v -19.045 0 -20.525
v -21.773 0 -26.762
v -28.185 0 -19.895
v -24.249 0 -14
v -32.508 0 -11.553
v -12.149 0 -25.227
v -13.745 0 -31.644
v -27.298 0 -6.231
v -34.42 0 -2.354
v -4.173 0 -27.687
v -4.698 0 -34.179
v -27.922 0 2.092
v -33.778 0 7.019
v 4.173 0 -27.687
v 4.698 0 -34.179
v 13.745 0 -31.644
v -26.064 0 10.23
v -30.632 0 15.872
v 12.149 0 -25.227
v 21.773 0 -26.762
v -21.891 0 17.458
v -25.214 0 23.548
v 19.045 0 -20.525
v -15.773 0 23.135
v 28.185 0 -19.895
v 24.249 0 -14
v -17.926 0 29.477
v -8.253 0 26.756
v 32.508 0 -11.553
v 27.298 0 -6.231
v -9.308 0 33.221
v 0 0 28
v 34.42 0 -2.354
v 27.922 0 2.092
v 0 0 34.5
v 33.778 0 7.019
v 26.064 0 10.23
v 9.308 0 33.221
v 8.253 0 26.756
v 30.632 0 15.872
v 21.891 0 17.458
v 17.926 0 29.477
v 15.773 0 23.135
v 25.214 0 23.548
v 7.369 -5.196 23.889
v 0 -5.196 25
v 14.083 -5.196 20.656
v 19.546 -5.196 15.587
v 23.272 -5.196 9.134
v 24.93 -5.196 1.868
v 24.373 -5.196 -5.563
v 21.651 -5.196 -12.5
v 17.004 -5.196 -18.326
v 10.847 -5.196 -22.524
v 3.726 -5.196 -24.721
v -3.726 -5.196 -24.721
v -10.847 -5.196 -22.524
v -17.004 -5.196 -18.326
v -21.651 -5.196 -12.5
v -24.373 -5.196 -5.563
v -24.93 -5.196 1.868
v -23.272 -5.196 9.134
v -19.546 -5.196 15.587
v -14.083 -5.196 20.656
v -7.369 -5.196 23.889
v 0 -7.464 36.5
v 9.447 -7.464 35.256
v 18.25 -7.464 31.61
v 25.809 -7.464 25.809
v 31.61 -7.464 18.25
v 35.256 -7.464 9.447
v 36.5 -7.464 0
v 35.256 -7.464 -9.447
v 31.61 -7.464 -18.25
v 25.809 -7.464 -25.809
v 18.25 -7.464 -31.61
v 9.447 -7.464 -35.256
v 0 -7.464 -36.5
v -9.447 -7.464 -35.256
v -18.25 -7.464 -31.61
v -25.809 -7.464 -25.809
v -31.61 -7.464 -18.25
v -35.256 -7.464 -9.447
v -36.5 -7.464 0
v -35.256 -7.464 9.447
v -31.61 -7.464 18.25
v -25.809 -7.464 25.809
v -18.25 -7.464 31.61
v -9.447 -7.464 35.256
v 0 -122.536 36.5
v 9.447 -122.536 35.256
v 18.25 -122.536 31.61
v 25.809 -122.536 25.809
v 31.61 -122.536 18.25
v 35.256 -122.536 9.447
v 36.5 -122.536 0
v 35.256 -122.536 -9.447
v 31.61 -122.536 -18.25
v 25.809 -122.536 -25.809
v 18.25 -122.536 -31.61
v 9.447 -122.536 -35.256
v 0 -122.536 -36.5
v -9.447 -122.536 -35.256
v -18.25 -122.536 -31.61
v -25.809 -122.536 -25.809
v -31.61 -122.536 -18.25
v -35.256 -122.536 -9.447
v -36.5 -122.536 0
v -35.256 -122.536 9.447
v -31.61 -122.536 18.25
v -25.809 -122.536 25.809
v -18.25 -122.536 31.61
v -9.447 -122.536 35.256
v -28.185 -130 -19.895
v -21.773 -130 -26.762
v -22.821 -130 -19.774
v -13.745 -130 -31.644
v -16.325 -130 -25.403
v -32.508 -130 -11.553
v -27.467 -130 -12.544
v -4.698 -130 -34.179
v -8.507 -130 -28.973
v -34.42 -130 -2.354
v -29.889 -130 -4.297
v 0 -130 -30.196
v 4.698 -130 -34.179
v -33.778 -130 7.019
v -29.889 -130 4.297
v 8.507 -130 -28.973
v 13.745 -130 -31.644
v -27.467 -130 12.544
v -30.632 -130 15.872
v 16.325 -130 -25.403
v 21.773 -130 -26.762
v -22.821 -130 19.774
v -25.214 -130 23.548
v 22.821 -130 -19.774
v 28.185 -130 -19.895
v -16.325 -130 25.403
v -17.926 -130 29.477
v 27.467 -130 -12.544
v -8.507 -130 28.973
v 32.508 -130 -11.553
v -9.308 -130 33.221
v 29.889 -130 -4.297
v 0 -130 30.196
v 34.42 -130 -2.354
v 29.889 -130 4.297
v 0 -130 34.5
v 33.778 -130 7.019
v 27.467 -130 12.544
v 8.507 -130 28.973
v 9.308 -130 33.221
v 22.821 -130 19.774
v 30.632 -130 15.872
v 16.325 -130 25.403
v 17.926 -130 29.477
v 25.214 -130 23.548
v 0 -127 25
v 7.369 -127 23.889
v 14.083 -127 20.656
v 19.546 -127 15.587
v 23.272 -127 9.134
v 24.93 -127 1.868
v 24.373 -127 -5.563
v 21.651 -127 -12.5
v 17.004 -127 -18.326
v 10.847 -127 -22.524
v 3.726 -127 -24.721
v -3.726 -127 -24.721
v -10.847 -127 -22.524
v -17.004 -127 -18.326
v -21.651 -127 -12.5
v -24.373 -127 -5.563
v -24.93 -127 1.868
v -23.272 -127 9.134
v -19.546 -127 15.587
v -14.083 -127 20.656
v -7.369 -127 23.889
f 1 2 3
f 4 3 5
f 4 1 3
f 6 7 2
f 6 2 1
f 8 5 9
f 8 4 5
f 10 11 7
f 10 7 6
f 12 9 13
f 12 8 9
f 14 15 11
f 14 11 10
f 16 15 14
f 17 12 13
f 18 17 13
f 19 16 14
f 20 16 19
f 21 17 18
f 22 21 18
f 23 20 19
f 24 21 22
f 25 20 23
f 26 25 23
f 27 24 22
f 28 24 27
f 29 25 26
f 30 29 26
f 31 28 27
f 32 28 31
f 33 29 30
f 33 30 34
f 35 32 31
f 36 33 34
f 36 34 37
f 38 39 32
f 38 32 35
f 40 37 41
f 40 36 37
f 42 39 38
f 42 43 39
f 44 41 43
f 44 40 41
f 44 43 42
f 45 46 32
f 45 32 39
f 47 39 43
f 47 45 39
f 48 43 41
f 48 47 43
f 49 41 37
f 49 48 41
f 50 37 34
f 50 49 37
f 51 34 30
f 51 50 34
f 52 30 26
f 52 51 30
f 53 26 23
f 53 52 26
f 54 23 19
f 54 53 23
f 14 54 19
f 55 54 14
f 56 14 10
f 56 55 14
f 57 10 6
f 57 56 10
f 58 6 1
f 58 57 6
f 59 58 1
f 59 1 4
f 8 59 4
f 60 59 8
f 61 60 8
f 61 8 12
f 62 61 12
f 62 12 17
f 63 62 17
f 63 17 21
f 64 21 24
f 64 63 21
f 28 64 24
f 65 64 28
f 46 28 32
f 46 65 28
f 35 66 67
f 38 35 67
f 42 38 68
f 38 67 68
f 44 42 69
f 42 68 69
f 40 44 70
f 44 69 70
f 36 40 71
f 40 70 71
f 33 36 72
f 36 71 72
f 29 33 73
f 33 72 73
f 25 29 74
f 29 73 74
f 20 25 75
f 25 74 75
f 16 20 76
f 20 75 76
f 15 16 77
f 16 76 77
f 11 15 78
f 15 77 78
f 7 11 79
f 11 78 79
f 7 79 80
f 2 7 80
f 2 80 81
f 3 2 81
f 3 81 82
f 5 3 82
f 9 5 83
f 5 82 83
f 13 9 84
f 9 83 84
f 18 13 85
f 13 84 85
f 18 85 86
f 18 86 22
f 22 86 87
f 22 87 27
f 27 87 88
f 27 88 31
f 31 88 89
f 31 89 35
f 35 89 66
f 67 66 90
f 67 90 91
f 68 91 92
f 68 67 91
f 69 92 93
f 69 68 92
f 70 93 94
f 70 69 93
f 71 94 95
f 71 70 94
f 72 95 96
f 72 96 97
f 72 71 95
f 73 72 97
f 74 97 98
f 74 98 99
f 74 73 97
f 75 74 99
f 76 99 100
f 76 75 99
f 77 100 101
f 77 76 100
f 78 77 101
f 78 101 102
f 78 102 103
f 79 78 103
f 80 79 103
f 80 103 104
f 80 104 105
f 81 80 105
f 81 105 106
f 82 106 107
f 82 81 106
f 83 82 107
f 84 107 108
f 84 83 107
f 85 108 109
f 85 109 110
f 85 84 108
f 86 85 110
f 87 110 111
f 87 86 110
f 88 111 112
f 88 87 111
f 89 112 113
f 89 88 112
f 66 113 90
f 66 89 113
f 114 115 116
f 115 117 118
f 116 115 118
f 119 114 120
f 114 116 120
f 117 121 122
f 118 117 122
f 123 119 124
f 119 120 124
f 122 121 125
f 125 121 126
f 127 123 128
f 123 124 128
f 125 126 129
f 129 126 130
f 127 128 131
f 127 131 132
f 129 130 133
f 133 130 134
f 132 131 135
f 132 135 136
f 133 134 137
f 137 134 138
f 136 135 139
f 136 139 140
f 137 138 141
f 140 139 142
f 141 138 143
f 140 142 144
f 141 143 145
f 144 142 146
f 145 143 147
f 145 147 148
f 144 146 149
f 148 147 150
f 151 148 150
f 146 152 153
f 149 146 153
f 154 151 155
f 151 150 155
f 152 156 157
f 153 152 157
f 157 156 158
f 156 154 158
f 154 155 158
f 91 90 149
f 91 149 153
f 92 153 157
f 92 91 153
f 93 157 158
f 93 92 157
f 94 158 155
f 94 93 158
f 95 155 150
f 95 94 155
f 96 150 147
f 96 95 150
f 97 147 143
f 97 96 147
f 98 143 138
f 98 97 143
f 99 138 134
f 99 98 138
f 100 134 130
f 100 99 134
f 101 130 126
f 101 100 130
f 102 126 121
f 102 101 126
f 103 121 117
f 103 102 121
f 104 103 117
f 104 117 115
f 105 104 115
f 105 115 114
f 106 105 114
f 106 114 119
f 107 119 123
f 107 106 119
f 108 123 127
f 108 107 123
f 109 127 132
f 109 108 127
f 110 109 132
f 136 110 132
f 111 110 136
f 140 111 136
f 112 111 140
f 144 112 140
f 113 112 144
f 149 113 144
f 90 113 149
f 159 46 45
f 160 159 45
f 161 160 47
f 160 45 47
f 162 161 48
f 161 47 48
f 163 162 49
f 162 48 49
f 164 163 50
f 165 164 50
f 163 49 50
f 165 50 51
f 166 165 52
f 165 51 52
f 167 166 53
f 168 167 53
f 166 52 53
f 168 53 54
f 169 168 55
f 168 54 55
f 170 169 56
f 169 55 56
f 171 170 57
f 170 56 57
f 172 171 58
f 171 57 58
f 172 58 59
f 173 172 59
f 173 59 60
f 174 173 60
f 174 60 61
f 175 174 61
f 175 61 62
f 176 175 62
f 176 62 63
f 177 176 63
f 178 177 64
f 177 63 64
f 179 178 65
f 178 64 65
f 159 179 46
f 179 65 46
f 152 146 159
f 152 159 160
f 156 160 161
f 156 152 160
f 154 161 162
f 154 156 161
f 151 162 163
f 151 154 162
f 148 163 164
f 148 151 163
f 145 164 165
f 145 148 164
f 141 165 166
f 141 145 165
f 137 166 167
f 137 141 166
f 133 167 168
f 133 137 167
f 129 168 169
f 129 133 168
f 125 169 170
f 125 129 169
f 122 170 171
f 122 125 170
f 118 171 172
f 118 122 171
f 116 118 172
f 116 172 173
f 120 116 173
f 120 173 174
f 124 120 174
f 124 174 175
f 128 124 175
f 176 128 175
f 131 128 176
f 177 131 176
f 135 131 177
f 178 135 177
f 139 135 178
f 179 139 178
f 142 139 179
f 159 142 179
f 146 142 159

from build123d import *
from OCP.BRepFilletAPI import BRepFilletAPI_MakeChamfer

# Parameters (mm, degrees)
SKETCH1_R           = 36.5
SKETCH1_R_2         = 25
BOSS_EXTRUDE1_DEPTH = 130
CHAMFER1_SIZE       = 3
CHAMFER1_SIZE2      = 5.196152423
CHAMFER2_SIZE       = 2
CHAMFER2_SIZE2      = 7.464101615
CHAMFER3_SIZE       = 2
CHAMFER3_SIZE2      = 7.464101615


with BuildPart() as part:
    # Sketch1 → Boss-Extrude1 (new body)
    with BuildSketch(Plane(origin=(0, 0, 0), x_dir=(1, 0, 0), z_dir=(0, 1, 0))):
        with Locations(Location((0, 0, 0), (0, 0, 270))):
            Circle(SKETCH1_R)
        with Locations(Location((0, 0, 0), (0, 0, 270))):
            Circle(SKETCH1_R_2, mode=Mode.SUBTRACT)
    extrude(amount=-BOSS_EXTRUDE1_DEPTH)

    # Chamfer1: one chamfer whose edges measure the first distance from different faces: ONE call of the kernel's chamfer builder (chamfer() names one face for all edges)
    chamfer1_edges_1 = [part.edges().sort_by_distance(p)[0] for p in [
        (0, -130, -25),
    ]]
    chamfer1_side_1 = [part.faces().sort_by_distance(p)[0] for p in [
        (0, -65, -25),
    ]]
    chamfer1_edges_2 = [part.edges().sort_by_distance(p)[0] for p in [
        (0, 0, -25),
    ]]
    chamfer1_side_2 = [part.faces().sort_by_distance(p)[0] for p in [
        (0, 0, -35.467624099),
    ]]
    chamfer1 = BRepFilletAPI_MakeChamfer(part.part.solid().wrapped)
    for e in chamfer1_edges_1:
        chamfer1.Add(CHAMFER1_SIZE, CHAMFER1_SIZE2, e.wrapped, chamfer1_side_1[0].wrapped)  # the first distance lies on this face
    for e in chamfer1_edges_2:
        chamfer1.Add(CHAMFER1_SIZE, CHAMFER1_SIZE2, e.wrapped, chamfer1_side_2[0].wrapped)  # the first distance lies on this face
    add(Compound.cast(chamfer1.Shape()), mode=Mode.REPLACE)

    # Chamfer2
    chamfer2_edges = [part.edges().sort_by_distance(p)[0] for p in [
        (0, -130, -36.5),
    ]]
    chamfer2_side = [part.faces().sort_by_distance(p)[0] for p in [
        (0, -130, -31.228528323),
    ]]
    chamfer(chamfer2_edges, length=CHAMFER2_SIZE, length2=CHAMFER2_SIZE2, reference=chamfer2_side[0])

    # Chamfer3
    chamfer3_edges = [part.edges().sort_by_distance(p)[0] for p in [
        (0, 0, -36.5),
    ]]
    chamfer3_side = [part.faces().sort_by_distance(p)[0] for p in [
        (0, 0, -29.032375901),
    ]]
    chamfer(chamfer3_edges, length=CHAMFER3_SIZE, length2=CHAMFER3_SIZE2, reference=chamfer3_side[0])


solid = part.part
